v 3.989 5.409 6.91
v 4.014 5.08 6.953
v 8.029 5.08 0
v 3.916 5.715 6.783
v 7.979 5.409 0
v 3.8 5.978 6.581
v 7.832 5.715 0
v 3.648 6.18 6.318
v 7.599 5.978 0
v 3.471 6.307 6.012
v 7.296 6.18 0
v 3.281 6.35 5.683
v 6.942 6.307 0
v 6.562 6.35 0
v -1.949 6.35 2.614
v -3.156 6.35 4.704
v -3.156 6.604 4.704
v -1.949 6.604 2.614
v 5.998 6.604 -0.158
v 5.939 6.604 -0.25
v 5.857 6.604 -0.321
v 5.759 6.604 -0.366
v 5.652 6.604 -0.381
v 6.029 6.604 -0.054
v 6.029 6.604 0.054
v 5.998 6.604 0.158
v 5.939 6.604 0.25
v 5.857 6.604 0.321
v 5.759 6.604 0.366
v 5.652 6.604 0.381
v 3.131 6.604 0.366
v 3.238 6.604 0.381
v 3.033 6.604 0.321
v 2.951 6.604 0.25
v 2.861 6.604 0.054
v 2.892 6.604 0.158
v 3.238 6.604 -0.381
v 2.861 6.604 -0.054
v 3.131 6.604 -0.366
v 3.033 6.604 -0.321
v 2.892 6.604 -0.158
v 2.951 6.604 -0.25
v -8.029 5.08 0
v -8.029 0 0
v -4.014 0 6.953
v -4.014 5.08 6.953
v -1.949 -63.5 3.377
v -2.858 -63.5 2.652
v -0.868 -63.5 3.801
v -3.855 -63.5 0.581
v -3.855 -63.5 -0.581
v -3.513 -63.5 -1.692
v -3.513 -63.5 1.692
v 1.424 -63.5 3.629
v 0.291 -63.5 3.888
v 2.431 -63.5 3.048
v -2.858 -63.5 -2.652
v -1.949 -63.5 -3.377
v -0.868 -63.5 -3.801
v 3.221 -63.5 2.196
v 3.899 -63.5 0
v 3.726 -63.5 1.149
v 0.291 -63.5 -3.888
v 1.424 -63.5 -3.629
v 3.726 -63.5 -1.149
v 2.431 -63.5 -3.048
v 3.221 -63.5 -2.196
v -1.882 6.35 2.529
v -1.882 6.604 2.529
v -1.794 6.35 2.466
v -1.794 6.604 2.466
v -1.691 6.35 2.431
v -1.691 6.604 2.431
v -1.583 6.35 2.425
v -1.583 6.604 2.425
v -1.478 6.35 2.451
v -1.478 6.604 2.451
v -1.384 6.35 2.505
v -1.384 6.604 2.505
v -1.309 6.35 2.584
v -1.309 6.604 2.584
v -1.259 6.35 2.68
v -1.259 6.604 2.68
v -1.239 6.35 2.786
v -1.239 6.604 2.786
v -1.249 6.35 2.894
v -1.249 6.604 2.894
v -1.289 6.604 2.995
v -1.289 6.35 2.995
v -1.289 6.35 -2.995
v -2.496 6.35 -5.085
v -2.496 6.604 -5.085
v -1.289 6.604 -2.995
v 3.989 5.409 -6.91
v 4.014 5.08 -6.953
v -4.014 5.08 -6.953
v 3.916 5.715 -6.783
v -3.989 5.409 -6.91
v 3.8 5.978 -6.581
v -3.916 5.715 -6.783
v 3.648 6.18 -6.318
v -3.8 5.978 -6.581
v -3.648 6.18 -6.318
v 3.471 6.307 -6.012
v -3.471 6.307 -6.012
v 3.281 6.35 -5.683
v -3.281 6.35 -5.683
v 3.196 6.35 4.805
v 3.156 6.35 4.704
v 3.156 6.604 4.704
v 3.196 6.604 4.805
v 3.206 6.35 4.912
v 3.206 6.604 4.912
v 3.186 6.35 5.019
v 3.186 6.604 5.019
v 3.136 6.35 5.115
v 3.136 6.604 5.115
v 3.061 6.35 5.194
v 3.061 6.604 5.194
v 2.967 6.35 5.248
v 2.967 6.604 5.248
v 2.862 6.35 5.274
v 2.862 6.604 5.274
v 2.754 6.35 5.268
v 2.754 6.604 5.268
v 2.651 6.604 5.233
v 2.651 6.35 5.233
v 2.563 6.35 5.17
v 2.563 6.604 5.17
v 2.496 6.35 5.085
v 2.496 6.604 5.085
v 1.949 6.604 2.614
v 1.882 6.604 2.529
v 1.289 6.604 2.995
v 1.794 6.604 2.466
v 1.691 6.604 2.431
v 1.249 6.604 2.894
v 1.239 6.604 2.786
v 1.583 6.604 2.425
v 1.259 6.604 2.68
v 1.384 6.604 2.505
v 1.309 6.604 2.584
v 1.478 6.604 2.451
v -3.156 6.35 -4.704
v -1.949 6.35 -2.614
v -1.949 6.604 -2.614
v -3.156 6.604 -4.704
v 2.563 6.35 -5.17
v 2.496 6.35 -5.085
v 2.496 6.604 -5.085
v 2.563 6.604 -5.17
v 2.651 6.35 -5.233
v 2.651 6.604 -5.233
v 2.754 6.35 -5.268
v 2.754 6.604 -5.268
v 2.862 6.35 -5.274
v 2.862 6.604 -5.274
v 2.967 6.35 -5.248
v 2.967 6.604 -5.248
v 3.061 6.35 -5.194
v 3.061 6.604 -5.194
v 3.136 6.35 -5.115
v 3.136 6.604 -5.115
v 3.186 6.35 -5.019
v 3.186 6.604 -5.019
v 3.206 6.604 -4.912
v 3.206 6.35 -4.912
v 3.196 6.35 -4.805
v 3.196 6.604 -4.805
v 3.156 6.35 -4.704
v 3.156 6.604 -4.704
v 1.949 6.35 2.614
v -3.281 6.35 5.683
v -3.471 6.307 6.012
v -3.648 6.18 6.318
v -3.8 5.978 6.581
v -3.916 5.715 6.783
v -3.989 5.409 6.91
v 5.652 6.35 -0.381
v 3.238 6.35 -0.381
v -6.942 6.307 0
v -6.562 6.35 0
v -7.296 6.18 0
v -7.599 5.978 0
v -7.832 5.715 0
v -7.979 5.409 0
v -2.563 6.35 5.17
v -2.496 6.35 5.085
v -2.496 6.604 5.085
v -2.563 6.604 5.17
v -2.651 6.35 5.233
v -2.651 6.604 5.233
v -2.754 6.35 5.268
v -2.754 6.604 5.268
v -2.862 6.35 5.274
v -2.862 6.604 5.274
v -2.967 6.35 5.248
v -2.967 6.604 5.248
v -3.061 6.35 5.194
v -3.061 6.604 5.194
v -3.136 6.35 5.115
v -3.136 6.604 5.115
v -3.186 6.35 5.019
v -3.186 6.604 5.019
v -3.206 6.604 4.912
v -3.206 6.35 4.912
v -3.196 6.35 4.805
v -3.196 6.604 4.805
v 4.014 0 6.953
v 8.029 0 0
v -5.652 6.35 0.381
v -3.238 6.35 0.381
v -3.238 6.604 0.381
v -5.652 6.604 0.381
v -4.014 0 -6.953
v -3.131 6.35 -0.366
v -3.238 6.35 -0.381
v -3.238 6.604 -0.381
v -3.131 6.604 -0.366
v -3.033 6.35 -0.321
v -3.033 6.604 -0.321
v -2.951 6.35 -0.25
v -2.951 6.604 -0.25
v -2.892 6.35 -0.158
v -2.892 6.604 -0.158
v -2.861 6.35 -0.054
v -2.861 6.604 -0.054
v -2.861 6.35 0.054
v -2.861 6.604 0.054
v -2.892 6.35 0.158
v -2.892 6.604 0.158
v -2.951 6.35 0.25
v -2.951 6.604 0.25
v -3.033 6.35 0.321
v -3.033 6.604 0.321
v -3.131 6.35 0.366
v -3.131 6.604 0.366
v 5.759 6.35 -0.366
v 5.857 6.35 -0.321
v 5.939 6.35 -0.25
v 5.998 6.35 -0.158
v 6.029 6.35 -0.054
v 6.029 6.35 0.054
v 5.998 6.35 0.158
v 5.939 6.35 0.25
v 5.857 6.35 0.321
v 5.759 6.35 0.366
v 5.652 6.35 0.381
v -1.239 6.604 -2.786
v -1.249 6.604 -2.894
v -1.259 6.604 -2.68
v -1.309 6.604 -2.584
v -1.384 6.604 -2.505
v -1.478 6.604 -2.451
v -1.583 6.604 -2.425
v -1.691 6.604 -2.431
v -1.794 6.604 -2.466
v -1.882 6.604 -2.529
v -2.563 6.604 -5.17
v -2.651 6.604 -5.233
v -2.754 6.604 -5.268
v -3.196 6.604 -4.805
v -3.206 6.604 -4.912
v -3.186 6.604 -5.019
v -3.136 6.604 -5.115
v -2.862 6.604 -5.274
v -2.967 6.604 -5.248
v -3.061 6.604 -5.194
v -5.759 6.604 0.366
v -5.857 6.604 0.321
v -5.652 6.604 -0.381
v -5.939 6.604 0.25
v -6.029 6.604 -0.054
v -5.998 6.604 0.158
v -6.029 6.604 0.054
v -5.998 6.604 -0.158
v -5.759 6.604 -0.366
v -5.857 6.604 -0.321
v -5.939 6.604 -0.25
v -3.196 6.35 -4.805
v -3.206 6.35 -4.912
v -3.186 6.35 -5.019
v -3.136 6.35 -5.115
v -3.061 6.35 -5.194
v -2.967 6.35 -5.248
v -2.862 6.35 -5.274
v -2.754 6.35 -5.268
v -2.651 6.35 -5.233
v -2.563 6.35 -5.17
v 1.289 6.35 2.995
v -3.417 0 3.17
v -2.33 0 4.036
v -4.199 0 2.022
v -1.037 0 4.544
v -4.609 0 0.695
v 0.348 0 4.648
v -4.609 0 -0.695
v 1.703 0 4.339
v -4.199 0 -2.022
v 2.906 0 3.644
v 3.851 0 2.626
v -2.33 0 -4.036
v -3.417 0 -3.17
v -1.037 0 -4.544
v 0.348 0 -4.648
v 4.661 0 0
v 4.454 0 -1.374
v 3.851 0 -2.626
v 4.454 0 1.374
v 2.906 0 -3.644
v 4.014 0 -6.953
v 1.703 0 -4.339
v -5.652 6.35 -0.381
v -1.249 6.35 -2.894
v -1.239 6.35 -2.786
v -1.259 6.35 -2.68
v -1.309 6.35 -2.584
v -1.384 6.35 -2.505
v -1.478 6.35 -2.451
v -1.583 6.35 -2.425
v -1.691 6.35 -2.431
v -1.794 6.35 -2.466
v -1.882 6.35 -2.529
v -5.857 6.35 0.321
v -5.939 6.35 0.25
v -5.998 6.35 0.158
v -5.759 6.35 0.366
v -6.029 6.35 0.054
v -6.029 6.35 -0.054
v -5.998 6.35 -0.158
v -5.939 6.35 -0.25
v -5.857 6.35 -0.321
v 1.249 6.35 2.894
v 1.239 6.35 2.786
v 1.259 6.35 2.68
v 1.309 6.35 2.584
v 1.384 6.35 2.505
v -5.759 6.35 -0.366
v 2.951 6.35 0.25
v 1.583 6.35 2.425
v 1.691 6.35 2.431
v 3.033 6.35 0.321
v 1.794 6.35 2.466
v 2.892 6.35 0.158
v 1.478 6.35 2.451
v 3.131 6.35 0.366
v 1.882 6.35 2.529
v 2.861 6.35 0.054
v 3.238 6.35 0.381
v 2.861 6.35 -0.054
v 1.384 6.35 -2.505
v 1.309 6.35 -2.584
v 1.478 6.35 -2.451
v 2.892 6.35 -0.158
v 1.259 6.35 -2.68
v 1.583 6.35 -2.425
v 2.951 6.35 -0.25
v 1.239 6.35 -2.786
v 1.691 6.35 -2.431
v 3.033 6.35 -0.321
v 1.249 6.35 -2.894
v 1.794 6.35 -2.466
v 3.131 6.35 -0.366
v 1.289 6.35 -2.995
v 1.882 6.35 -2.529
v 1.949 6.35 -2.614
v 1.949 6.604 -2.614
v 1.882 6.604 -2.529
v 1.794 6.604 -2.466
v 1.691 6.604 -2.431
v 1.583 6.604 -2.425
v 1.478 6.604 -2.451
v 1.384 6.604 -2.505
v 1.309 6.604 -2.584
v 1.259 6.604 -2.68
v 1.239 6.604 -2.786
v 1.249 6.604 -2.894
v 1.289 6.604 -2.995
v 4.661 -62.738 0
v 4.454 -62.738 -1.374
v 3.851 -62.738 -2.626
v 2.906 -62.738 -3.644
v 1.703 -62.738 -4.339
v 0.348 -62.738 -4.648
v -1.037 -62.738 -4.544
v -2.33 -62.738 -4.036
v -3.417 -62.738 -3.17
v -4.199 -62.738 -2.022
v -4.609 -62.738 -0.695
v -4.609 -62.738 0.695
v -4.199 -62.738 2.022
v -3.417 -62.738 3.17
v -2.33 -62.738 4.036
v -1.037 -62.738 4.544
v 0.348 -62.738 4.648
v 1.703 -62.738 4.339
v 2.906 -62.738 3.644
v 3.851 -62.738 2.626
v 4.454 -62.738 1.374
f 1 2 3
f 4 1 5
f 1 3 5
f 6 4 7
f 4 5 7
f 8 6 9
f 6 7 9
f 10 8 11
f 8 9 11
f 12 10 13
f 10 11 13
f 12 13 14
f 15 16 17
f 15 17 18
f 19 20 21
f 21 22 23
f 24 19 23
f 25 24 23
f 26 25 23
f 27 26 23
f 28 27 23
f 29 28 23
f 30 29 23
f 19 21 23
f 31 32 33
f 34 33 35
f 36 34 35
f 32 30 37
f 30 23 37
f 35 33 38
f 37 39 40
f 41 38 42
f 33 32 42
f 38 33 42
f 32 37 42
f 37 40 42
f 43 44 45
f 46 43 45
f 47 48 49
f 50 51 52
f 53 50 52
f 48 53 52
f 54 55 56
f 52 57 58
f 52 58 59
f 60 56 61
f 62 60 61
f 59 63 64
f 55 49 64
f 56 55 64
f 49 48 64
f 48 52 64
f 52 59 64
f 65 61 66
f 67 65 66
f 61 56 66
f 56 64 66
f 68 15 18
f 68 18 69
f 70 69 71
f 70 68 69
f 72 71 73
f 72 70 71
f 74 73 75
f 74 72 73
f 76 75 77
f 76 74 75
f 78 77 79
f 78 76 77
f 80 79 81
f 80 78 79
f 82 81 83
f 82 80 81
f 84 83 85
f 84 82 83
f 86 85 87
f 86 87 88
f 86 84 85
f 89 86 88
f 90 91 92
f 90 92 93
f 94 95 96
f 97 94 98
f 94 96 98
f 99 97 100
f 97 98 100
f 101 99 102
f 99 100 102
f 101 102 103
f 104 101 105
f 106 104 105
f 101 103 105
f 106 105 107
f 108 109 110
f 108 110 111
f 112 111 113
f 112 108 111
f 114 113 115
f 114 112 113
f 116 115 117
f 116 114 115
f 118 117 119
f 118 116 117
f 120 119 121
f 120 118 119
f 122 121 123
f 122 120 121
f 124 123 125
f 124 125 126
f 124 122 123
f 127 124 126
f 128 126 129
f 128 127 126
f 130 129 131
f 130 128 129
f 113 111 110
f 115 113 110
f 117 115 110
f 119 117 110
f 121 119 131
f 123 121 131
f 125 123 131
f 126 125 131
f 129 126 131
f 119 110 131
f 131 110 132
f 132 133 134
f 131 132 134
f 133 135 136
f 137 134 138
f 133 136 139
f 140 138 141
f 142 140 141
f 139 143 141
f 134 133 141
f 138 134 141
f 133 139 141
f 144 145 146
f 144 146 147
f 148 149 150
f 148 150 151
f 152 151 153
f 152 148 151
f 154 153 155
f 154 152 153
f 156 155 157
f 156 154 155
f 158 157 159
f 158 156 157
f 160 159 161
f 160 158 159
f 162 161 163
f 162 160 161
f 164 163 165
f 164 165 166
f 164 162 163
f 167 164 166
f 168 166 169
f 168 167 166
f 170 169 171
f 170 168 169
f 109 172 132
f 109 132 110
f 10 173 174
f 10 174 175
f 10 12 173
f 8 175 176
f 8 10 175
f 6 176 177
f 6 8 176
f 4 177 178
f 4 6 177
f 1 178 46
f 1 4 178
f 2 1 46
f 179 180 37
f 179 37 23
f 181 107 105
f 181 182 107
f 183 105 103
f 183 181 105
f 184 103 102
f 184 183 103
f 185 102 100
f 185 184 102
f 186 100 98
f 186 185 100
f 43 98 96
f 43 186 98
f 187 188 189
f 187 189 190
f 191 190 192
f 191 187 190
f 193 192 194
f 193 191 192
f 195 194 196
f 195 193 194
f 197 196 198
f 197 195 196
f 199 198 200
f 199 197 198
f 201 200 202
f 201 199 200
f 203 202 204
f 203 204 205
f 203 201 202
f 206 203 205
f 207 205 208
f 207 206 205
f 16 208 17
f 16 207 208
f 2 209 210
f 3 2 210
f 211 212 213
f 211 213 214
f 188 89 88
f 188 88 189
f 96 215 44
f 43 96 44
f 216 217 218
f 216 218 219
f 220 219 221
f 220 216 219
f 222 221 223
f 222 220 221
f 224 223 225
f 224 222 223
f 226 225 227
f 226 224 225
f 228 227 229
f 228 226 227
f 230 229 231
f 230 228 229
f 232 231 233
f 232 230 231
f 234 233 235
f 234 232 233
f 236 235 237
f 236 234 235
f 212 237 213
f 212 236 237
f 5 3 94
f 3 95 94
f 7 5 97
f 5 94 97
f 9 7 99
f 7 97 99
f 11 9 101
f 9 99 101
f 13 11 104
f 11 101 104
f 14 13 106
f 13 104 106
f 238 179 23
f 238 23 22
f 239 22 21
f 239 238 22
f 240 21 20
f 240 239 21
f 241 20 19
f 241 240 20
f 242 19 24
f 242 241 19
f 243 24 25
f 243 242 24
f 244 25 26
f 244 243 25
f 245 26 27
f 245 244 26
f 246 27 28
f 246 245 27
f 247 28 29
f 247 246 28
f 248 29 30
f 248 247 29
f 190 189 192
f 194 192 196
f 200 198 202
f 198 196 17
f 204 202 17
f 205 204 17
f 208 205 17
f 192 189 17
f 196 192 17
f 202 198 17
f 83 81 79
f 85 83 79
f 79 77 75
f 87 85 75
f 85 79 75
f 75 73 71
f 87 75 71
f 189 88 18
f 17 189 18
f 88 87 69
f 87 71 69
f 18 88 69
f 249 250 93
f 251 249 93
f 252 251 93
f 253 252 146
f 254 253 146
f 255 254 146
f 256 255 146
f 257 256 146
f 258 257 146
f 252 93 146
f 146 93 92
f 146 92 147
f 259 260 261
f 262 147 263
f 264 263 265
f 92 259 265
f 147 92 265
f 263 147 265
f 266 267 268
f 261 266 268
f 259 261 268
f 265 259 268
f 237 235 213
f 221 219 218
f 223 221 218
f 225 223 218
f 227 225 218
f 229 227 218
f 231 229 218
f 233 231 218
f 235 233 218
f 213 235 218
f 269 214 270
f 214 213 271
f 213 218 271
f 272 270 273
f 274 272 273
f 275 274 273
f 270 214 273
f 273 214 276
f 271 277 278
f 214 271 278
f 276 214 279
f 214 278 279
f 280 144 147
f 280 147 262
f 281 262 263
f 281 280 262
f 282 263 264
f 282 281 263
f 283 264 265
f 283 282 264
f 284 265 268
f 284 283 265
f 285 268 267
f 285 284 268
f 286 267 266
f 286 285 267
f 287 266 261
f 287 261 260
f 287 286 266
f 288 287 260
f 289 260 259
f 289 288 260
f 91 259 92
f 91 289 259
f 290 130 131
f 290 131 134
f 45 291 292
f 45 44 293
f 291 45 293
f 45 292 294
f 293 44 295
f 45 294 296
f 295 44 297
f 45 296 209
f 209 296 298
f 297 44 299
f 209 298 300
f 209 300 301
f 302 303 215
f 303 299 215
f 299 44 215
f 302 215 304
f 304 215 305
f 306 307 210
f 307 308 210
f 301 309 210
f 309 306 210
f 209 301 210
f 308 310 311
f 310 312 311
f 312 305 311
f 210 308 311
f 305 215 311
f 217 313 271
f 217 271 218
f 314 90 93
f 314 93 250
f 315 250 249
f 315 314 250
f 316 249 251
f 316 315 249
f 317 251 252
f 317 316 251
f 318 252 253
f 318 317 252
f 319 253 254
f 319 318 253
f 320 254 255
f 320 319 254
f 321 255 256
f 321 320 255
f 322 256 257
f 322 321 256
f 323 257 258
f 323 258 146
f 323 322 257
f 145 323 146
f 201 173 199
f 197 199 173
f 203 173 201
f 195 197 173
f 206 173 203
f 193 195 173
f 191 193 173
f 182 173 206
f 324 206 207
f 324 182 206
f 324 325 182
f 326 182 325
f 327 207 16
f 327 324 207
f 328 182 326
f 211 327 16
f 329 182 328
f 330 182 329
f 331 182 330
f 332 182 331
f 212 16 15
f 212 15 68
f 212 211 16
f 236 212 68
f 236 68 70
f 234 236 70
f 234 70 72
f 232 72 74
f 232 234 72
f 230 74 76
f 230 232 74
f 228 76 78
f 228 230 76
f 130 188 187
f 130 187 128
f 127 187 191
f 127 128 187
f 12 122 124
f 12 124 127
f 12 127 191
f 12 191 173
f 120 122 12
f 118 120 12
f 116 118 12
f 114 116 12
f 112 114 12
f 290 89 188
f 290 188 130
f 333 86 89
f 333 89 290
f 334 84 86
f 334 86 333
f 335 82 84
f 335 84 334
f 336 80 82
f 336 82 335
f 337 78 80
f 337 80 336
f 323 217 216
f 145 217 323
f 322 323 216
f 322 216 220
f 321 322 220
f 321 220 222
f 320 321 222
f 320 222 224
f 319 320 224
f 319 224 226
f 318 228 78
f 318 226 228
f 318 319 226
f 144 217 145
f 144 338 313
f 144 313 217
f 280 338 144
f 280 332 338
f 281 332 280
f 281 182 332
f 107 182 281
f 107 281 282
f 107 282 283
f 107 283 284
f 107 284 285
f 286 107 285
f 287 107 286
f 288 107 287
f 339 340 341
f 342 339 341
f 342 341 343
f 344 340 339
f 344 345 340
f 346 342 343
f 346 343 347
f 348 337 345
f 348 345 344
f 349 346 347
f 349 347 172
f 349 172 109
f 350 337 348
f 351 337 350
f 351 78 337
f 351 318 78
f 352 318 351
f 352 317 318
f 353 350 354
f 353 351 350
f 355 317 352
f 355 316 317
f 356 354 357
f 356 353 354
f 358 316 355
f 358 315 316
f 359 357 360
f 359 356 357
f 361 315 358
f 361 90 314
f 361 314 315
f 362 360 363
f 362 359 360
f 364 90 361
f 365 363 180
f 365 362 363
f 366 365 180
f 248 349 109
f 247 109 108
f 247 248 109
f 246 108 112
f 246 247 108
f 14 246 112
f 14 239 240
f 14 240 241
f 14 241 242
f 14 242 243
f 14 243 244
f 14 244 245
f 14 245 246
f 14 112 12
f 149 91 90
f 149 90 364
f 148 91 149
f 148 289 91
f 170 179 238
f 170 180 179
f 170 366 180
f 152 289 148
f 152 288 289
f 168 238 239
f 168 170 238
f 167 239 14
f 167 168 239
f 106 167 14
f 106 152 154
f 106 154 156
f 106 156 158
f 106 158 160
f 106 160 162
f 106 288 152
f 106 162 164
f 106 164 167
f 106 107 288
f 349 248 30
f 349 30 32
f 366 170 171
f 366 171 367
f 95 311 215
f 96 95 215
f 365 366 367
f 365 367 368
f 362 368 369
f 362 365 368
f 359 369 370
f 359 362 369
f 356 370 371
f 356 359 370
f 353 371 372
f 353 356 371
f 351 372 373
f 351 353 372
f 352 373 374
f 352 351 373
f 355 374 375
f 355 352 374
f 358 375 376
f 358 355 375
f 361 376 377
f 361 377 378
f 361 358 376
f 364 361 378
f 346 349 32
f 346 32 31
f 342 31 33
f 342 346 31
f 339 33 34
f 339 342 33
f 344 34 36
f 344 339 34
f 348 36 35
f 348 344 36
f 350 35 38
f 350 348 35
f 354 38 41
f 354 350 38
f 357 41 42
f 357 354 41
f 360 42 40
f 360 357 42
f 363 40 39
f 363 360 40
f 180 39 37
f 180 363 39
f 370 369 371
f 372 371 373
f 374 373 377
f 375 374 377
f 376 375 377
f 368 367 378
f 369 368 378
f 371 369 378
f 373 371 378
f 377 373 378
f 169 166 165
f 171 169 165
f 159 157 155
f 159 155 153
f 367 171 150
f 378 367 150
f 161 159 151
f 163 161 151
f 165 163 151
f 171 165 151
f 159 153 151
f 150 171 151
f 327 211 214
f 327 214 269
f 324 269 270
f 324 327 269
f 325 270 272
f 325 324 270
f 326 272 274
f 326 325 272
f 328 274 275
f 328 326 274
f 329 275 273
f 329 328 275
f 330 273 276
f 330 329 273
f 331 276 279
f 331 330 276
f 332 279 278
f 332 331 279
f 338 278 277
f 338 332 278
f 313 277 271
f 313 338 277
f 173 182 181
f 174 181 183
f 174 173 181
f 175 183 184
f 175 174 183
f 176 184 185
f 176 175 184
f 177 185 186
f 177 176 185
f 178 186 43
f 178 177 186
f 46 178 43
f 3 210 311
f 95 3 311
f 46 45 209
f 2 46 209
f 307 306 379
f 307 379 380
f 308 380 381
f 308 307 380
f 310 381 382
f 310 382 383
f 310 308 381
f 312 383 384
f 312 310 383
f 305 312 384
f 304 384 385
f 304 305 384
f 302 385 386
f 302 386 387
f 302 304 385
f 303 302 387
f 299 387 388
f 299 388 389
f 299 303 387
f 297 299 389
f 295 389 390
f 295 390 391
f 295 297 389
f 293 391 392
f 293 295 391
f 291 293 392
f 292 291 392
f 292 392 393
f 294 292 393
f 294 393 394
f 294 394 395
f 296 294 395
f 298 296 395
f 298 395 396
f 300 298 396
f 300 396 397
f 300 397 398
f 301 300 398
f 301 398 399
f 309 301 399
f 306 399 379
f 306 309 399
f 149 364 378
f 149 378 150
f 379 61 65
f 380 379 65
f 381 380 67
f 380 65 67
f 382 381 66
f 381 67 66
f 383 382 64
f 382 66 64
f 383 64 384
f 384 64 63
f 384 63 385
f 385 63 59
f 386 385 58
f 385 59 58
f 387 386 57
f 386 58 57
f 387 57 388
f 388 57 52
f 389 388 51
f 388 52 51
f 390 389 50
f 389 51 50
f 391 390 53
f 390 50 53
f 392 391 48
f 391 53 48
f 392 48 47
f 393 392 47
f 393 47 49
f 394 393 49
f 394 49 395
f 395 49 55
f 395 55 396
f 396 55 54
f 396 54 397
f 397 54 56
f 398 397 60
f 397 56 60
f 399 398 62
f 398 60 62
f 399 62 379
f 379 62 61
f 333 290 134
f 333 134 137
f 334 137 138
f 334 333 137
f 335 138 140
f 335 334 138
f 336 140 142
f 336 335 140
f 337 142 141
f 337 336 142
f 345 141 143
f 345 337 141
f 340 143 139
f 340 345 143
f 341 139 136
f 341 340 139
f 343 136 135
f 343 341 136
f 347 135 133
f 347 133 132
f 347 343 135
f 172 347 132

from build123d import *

# Parameters (mm, degrees)
SKETCH1_R           = 4.6609
BOSS_EXTRUDE1_DEPTH = 63.5
BOSS_EXTRUDE2_DEPTH = 6.35
FILLET1_R           = 1.27
CHAMFER1_SIZE       = 0.762
BOSS_EXTRUDE3_DEPTH = 0.254


with BuildPart() as part:
    # Sketch1 → Boss-Extrude1 (new body)
    with BuildSketch(Plane(origin=(0, 0, 0), x_dir=(1, 0, 0), z_dir=(0, 1, 0))):
        Circle(SKETCH1_R)
    extrude(amount=-BOSS_EXTRUDE1_DEPTH)

    # Sketch2 → Boss-Extrude2 (add)
    with BuildSketch(Plane(origin=(0, 0, 0), x_dir=(1, 0, 0), z_dir=(0, 1, 0))):
        Polygon((8.028921518, 0), (4.014460759, 6.95325), (-4.014460759, 6.95325), (-8.028921518, 0), (-4.014460759, -6.95325), (4.014460759, -6.95325), align=None)
    extrude(amount=BOSS_EXTRUDE2_DEPTH)

    # Fillet1
    fillet1_edges = [part.edges().sort_by_distance(p)[0] for p in [
        (6.021691139, 6.35, -3.476625),
        (6.021691139, 6.35, 3.476625),
        (0, 6.35, -6.95325),
        (-6.021691139, 6.35, -3.476625),
        (-6.021691139, 6.35, 3.476625),
        (0, 6.35, 6.95325),
    ]]
    fillet(fillet1_edges, radius=FILLET1_R)

    # Chamfer1
    chamfer1_edges = [part.edges().sort_by_distance(p)[0] for p in [
        (-4.6609, -63.5, 0),
    ]]
    chamfer(chamfer1_edges, length=CHAMFER1_SIZE)

    # Sketch3 → Boss-Extrude3 (add)
    with BuildSketch(Plane(origin=(0, 6.35, 0), x_dir=(1, 0, 0), z_dir=(0, 1, 0))):
        with BuildLine():
            Line((5.6515, -0.381), (3.2385, -0.381))
            ThreePointArc((3.2385, -0.381), (2.8575, 0), (3.2385, 0.381))
            Line((3.2385, 0.381), (5.6515, 0.381))
            ThreePointArc((5.6515, 0.381), (6.0325, 0), (5.6515, -0.381))
        make_face()
        with BuildLine():
            Line((3.155705679, 4.703842569), (1.949205679, 2.61412327))
            ThreePointArc((1.949205679, 2.61412327), (1.42875, 2.474667591), (1.289294321, 2.99512327))
            Line((1.289294321, 2.99512327), (2.495794321, 5.084842569))
            ThreePointArc((2.495794321, 5.084842569), (3.01625, 5.224298248), (3.155705679, 4.703842569))
        make_face()
        with BuildLine():
            Line((-2.495794321, 5.084842569), (-1.289294321, 2.99512327))
            ThreePointArc((-1.289294321, 2.99512327), (-1.42875, 2.474667591), (-1.949205679, 2.61412327))
            Line((-1.949205679, 2.61412327), (-3.155705679, 4.703842569))
            ThreePointArc((-3.155705679, 4.703842569), (-3.01625, 5.224298248), (-2.495794321, 5.084842569))
        make_face()
        with BuildLine():
            Line((-5.6515, 0.381), (-3.2385, 0.381))
            ThreePointArc((-3.2385, 0.381), (-2.8575, 0), (-3.2385, -0.381))
            Line((-3.2385, -0.381), (-5.6515, -0.381))
            ThreePointArc((-5.6515, -0.381), (-6.0325, 0), (-5.6515, 0.381))
        make_face()
        with BuildLine():
            Line((-3.155705679, -4.703842569), (-1.949205679, -2.61412327))
            ThreePointArc((-1.949205679, -2.61412327), (-1.42875, -2.474667591), (-1.289294321, -2.99512327))
            Line((-1.289294321, -2.99512327), (-2.495794321, -5.084842569))
            ThreePointArc((-2.495794321, -5.084842569), (-3.01625, -5.224298248), (-3.155705679, -4.703842569))
        make_face()
        with BuildLine():
            Line((2.495794321, -5.084842569), (1.289294321, -2.99512327))
            ThreePointArc((1.289294321, -2.99512327), (1.42875, -2.474667591), (1.949205679, -2.61412327))
            Line((1.949205679, -2.61412327), (3.155705679, -4.703842569))
            ThreePointArc((3.155705679, -4.703842569), (3.01625, -5.224298248), (2.495794321, -5.084842569))
        make_face()
    extrude(amount=BOSS_EXTRUDE3_DEPTH)


solid = part.part
